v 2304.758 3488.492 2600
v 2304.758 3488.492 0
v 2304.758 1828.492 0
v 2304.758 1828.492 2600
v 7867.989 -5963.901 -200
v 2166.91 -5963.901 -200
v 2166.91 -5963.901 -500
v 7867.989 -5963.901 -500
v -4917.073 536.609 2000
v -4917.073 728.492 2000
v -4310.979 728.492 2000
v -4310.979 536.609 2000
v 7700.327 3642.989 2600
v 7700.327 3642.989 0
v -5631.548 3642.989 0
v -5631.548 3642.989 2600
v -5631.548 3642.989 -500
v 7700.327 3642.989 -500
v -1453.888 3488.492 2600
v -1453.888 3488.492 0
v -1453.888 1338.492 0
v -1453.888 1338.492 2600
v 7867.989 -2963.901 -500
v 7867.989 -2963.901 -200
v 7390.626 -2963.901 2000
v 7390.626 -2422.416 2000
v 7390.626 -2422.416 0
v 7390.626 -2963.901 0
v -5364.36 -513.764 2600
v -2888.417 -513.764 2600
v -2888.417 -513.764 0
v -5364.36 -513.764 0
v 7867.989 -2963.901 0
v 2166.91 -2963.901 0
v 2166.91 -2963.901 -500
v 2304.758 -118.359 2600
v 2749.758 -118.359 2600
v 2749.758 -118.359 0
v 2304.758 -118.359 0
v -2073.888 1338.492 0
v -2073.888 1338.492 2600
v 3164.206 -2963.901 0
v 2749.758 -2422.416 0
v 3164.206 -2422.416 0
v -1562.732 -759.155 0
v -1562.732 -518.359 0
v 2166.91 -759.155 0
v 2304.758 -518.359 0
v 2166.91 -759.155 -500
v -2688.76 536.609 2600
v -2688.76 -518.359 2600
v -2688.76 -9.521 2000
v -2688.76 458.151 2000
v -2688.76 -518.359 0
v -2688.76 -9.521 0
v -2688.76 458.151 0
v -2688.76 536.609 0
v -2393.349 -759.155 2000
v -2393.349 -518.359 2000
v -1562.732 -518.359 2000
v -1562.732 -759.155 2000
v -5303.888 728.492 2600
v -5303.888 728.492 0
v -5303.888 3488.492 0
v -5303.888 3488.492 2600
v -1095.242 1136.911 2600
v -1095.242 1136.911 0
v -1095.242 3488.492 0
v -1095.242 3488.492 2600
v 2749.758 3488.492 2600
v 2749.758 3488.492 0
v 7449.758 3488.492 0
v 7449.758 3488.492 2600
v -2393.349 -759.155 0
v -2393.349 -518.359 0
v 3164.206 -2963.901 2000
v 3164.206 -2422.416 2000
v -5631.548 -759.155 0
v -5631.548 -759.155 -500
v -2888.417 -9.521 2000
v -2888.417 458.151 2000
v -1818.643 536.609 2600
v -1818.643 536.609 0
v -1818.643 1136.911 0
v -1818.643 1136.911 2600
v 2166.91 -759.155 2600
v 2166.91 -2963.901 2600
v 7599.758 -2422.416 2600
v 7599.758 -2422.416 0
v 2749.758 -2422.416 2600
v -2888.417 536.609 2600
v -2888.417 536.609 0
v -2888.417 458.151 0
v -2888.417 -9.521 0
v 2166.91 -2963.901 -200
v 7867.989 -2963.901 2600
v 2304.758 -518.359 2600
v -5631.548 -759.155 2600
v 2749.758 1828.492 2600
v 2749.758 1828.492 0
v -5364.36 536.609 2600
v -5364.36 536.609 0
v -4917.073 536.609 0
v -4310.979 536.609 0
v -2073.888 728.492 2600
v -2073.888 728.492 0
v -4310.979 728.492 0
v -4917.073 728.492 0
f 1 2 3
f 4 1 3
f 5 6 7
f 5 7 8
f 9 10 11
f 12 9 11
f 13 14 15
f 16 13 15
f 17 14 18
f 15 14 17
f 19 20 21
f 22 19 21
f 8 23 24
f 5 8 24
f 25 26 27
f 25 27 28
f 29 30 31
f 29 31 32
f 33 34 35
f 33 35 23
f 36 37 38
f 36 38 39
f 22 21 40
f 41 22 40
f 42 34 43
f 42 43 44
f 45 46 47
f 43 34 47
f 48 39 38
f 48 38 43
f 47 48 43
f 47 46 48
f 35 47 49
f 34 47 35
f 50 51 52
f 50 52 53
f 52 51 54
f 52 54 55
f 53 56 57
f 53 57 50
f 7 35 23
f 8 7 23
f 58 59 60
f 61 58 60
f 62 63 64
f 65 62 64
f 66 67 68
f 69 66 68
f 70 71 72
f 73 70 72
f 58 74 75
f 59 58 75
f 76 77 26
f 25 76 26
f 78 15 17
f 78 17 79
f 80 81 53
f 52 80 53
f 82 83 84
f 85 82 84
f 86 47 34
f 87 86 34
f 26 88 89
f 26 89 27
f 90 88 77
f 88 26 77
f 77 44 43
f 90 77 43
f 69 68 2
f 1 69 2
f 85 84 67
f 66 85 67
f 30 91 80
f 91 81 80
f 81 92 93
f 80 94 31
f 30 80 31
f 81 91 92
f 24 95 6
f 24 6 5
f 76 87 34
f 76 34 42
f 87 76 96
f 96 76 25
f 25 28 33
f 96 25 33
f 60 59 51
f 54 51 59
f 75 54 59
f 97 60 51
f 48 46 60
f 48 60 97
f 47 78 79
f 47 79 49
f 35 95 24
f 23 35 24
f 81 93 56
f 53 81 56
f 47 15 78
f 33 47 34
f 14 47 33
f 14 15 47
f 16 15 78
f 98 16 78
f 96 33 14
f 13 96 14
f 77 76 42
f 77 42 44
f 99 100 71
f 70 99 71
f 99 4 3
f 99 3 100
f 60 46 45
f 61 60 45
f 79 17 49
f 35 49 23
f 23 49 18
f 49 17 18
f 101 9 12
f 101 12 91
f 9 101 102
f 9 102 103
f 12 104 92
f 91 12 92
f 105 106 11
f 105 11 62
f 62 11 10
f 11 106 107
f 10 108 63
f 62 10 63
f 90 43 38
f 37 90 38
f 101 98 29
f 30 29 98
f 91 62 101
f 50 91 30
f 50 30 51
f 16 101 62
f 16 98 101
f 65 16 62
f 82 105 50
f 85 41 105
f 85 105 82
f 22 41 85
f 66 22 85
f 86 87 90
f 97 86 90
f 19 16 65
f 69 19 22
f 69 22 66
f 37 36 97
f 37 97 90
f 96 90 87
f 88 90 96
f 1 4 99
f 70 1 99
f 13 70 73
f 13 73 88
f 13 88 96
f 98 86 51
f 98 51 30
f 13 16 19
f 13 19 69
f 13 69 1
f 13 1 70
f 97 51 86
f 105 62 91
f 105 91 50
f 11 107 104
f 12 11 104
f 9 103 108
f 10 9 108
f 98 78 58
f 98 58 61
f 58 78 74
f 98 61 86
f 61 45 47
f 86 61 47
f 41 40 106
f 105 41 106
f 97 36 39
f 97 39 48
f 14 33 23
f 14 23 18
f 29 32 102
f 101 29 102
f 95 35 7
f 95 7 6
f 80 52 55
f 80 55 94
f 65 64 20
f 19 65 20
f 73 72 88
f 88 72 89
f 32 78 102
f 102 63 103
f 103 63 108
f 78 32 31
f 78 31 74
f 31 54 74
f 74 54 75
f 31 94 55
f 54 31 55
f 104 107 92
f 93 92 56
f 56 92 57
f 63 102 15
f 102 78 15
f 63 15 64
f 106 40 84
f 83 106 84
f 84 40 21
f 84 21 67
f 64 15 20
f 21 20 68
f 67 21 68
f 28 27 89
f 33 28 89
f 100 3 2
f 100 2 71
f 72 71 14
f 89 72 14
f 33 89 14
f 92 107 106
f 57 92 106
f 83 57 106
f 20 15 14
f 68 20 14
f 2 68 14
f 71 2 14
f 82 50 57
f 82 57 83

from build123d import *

# Parameters (mm, degrees)
F0_W     = 830.6173386342
F0_H     = 240.7961136216
F0_W_2   = 4226.4206153695
F0_H_2   = 541.4849875656
F0_W_3   = 199.6572122673
F0_H_3   = 467.6724689261
F0_W_4   = 606.0934546265
F0_H_4   = 191.8828443388
F1_DEPTH = 500
F2_DEPTH = 2600
F4_W     = 830.6173386342
F4_H     = 240.7961136216
F4_W_2   = 606.0934546265
F4_H_2   = 191.8828443388
F4_W_3   = 199.6572122673
F4_H_3   = 467.6724689261
F4_W_4   = 4226.4206153695
F4_H_4   = 541.4849875656
F5_DEPTH = 600
F6_W     = 5701.0793440601
F6_H     = 300
F7_DEPTH = 3000


with BuildPart() as f1:
    # F0 (on Top) → F1 (new body)
    with BuildSketch(Plane.XY):
        Polygon((-5631.5483541938, -759.1554373126), (-2393.3489004288, -759.1554373126), (-2393.3489004288, -518.359323691), (-2688.7602510609, -518.359323691), (-2688.7602510609, -9.5210987867), (-2888.4174633282, -9.5210987867), (-2888.4174633282, -513.7642672382), (-5364.3597898582, -513.7642672382), (-5364.3597898582, 536.6092310389), (-4917.0726253467, 536.6092310389), (-4917.0726253467, 728.4920753777), (-5303.8878975014, 728.4920753777), (-5303.8878975014, 3488.4920753777), (-1453.8878975014, 3488.4920753777), (-1453.8878975014, 1338.4920753777), (-2073.8878975014, 1338.4920753777), (-2073.8878975014, 728.4920753777), (-4310.9791707202, 728.4920753777), (-4310.9791707202, 536.6092310389), (-2888.4174633282, 536.6092310389), (-2888.4174633282, 458.1513701394), (-2688.7602510609, 458.1513701394), (-2688.7602510609, 536.6092310389), (-1818.643155098, 536.6092310389), (-1818.643155098, 1136.9112424095), (-1494.0677461723, 1136.9112424095), (-1095.2420802859, 1136.9112424095), (-1095.2420802859, 3488.4920753777), (2304.7579197141, 3488.4920753777), (2304.7579197141, 1828.4920753777), (2749.7579197141, 1828.4920753777), (2749.7579197141, 3488.4920753777), (7449.7579197141, 3488.4920753777), (7599.7579197141, -2422.415971756), (7390.6263395982, -2422.415971756), (7390.6263395982, -2963.9009593216), (7867.9892022931, -2963.9009593216), (7700.3273963928, 3642.9891586304), (-5631.5483541938, 3642.9891586304), align=None)
        with Locations((-1978.0402311117, -638.7573805018)):
            Rectangle(F0_W, F0_H)
        Polygon((-1562.7315617945, -518.359323691), (-1562.7315617945, -759.1554373126), (2166.909858233, -759.1554373126), (2166.909858233, -2963.9009593216), (3164.2057242287, -2963.9009593216), (3164.2057242287, -2422.415971756), (2749.7579197141, -2422.415971756), (2749.7579197141, -118.359323691), (2304.7579197141, -118.359323691), (2304.7579197141, -518.359323691), align=None)
        with Locations((5277.4160319135, -2693.1584655388)):
            Rectangle(F0_W_2, F0_H_2)
        with Locations((-2788.5888571945, 224.3151356764)):
            Rectangle(F0_W_3, F0_H_3)
        with Locations((-4614.0258980334, 632.5506532083)):
            Rectangle(F0_W_4, F0_H_4)
        Polygon((-4917.0726253467, 728.4920753777), (-4310.9791707202, 728.4920753777), (-2073.8878975014, 728.4920753777), (-2073.8878975014, 1338.4920753777), (-1453.8878975014, 1338.4920753777), (-1453.8878975014, 3488.4920753777), (-5303.8878975014, 3488.4920753777), (-5303.8878975014, 728.4920753777), align=None)
        Polygon((-2888.4174633282, -513.7642672382), (-2888.4174633282, -9.5210987867), (-2888.4174633282, 458.1513701394), (-2888.4174633282, 536.6092310389), (-4310.9791707202, 536.6092310389), (-4917.0726253467, 536.6092310389), (-5364.3597898582, 536.6092310389), (-5364.3597898582, -513.7642672382), align=None)
        Polygon((-2688.7602510609, -518.359323691), (-2393.3489004288, -518.359323691), (-1562.7315617945, -518.359323691), (2304.7579197141, -518.359323691), (2304.7579197141, -118.359323691), (2749.7579197141, -118.359323691), (2749.7579197141, -2422.415971756), (3164.2057242287, -2422.415971756), (7390.6263395982, -2422.415971756), (7599.7579197141, -2422.415971756), (7449.7579197141, 3488.4920753777), (2749.7579197141, 3488.4920753777), (2749.7579197141, 1828.4920753777), (2304.7579197141, 1828.4920753777), (2304.7579197141, 3488.4920753777), (-1095.2420802859, 3488.4920753777), (-1095.2420802859, 1136.9112424095), (-1494.0677461723, 1136.9112424095), (-1818.643155098, 1136.9112424095), (-1818.643155098, 536.6092310389), (-2688.7602510609, 536.6092310389), (-2688.7602510609, 458.1513701394), (-2688.7602510609, -9.5210987867), align=None)
    extrude(amount=-F1_DEPTH)


with BuildPart() as f2:
    # F0 (on Top) → F2 (new body)
    with BuildSketch(Plane.XY):
        Polygon((-5631.5483541938, -759.1554373126), (-2393.3489004288, -759.1554373126), (-2393.3489004288, -518.359323691), (-2688.7602510609, -518.359323691), (-2688.7602510609, -9.5210987867), (-2888.4174633282, -9.5210987867), (-2888.4174633282, -513.7642672382), (-5364.3597898582, -513.7642672382), (-5364.3597898582, 536.6092310389), (-4917.0726253467, 536.6092310389), (-4917.0726253467, 728.4920753777), (-5303.8878975014, 728.4920753777), (-5303.8878975014, 3488.4920753777), (-1453.8878975014, 3488.4920753777), (-1453.8878975014, 1338.4920753777), (-2073.8878975014, 1338.4920753777), (-2073.8878975014, 728.4920753777), (-4310.9791707202, 728.4920753777), (-4310.9791707202, 536.6092310389), (-2888.4174633282, 536.6092310389), (-2888.4174633282, 458.1513701394), (-2688.7602510609, 458.1513701394), (-2688.7602510609, 536.6092310389), (-1818.643155098, 536.6092310389), (-1818.643155098, 1136.9112424095), (-1494.0677461723, 1136.9112424095), (-1095.2420802859, 1136.9112424095), (-1095.2420802859, 3488.4920753777), (2304.7579197141, 3488.4920753777), (2304.7579197141, 1828.4920753777), (2749.7579197141, 1828.4920753777), (2749.7579197141, 3488.4920753777), (7449.7579197141, 3488.4920753777), (7599.7579197141, -2422.415971756), (7390.6263395982, -2422.415971756), (7390.6263395982, -2963.9009593216), (7867.9892022931, -2963.9009593216), (7700.3273963928, 3642.9891586304), (-5631.5483541938, 3642.9891586304), align=None)
    extrude(amount=F2_DEPTH)



with BuildPart() as f2b:
    # F0 (on Top) → F2, piece 2 (new body)
    with BuildSketch(Plane.XY):
        Polygon((-1562.7315617945, -518.359323691), (-1562.7315617945, -759.1554373126), (2166.909858233, -759.1554373126), (2166.909858233, -2963.9009593216), (3164.2057242287, -2963.9009593216), (3164.2057242287, -2422.415971756), (2749.7579197141, -2422.415971756), (2749.7579197141, -118.359323691), (2304.7579197141, -118.359323691), (2304.7579197141, -518.359323691), align=None)
    extrude(amount=F2_DEPTH)


with BuildPart() as f2_1:
    add(f2.part)

    add(f2b.part)  # F5 merges F2b
    # F4 (on offset) → F5 (join, through all)
    with BuildSketch(Plane.XY.offset(2000)):
        with Locations((-1978.0402311117, -638.7573805018)):
            Rectangle(F4_W, F4_H)
        with Locations((-4614.0258980334, 632.5506532083)):
            Rectangle(F4_W_2, F4_H_2)
        with Locations((-2788.5888571945, 224.3151356764)):
            Rectangle(F4_W_3, F4_H_3)
        with Locations((5277.4160319135, -2693.1584655388)):
            Rectangle(F4_W_4, F4_H_4)
    extrude(amount=F5_DEPTH)


with BuildPart() as f7:
    # F6 (on face) → F7 (new body)
    with BuildSketch(Plane.XZ.offset(2963.9009593216)):
        with Locations((5017.449530263, -350)):
            Rectangle(F6_W, F6_H)
    extrude(amount=F7_DEPTH)


solid = Compound([f1.part, f2_1.part, f7.part])
